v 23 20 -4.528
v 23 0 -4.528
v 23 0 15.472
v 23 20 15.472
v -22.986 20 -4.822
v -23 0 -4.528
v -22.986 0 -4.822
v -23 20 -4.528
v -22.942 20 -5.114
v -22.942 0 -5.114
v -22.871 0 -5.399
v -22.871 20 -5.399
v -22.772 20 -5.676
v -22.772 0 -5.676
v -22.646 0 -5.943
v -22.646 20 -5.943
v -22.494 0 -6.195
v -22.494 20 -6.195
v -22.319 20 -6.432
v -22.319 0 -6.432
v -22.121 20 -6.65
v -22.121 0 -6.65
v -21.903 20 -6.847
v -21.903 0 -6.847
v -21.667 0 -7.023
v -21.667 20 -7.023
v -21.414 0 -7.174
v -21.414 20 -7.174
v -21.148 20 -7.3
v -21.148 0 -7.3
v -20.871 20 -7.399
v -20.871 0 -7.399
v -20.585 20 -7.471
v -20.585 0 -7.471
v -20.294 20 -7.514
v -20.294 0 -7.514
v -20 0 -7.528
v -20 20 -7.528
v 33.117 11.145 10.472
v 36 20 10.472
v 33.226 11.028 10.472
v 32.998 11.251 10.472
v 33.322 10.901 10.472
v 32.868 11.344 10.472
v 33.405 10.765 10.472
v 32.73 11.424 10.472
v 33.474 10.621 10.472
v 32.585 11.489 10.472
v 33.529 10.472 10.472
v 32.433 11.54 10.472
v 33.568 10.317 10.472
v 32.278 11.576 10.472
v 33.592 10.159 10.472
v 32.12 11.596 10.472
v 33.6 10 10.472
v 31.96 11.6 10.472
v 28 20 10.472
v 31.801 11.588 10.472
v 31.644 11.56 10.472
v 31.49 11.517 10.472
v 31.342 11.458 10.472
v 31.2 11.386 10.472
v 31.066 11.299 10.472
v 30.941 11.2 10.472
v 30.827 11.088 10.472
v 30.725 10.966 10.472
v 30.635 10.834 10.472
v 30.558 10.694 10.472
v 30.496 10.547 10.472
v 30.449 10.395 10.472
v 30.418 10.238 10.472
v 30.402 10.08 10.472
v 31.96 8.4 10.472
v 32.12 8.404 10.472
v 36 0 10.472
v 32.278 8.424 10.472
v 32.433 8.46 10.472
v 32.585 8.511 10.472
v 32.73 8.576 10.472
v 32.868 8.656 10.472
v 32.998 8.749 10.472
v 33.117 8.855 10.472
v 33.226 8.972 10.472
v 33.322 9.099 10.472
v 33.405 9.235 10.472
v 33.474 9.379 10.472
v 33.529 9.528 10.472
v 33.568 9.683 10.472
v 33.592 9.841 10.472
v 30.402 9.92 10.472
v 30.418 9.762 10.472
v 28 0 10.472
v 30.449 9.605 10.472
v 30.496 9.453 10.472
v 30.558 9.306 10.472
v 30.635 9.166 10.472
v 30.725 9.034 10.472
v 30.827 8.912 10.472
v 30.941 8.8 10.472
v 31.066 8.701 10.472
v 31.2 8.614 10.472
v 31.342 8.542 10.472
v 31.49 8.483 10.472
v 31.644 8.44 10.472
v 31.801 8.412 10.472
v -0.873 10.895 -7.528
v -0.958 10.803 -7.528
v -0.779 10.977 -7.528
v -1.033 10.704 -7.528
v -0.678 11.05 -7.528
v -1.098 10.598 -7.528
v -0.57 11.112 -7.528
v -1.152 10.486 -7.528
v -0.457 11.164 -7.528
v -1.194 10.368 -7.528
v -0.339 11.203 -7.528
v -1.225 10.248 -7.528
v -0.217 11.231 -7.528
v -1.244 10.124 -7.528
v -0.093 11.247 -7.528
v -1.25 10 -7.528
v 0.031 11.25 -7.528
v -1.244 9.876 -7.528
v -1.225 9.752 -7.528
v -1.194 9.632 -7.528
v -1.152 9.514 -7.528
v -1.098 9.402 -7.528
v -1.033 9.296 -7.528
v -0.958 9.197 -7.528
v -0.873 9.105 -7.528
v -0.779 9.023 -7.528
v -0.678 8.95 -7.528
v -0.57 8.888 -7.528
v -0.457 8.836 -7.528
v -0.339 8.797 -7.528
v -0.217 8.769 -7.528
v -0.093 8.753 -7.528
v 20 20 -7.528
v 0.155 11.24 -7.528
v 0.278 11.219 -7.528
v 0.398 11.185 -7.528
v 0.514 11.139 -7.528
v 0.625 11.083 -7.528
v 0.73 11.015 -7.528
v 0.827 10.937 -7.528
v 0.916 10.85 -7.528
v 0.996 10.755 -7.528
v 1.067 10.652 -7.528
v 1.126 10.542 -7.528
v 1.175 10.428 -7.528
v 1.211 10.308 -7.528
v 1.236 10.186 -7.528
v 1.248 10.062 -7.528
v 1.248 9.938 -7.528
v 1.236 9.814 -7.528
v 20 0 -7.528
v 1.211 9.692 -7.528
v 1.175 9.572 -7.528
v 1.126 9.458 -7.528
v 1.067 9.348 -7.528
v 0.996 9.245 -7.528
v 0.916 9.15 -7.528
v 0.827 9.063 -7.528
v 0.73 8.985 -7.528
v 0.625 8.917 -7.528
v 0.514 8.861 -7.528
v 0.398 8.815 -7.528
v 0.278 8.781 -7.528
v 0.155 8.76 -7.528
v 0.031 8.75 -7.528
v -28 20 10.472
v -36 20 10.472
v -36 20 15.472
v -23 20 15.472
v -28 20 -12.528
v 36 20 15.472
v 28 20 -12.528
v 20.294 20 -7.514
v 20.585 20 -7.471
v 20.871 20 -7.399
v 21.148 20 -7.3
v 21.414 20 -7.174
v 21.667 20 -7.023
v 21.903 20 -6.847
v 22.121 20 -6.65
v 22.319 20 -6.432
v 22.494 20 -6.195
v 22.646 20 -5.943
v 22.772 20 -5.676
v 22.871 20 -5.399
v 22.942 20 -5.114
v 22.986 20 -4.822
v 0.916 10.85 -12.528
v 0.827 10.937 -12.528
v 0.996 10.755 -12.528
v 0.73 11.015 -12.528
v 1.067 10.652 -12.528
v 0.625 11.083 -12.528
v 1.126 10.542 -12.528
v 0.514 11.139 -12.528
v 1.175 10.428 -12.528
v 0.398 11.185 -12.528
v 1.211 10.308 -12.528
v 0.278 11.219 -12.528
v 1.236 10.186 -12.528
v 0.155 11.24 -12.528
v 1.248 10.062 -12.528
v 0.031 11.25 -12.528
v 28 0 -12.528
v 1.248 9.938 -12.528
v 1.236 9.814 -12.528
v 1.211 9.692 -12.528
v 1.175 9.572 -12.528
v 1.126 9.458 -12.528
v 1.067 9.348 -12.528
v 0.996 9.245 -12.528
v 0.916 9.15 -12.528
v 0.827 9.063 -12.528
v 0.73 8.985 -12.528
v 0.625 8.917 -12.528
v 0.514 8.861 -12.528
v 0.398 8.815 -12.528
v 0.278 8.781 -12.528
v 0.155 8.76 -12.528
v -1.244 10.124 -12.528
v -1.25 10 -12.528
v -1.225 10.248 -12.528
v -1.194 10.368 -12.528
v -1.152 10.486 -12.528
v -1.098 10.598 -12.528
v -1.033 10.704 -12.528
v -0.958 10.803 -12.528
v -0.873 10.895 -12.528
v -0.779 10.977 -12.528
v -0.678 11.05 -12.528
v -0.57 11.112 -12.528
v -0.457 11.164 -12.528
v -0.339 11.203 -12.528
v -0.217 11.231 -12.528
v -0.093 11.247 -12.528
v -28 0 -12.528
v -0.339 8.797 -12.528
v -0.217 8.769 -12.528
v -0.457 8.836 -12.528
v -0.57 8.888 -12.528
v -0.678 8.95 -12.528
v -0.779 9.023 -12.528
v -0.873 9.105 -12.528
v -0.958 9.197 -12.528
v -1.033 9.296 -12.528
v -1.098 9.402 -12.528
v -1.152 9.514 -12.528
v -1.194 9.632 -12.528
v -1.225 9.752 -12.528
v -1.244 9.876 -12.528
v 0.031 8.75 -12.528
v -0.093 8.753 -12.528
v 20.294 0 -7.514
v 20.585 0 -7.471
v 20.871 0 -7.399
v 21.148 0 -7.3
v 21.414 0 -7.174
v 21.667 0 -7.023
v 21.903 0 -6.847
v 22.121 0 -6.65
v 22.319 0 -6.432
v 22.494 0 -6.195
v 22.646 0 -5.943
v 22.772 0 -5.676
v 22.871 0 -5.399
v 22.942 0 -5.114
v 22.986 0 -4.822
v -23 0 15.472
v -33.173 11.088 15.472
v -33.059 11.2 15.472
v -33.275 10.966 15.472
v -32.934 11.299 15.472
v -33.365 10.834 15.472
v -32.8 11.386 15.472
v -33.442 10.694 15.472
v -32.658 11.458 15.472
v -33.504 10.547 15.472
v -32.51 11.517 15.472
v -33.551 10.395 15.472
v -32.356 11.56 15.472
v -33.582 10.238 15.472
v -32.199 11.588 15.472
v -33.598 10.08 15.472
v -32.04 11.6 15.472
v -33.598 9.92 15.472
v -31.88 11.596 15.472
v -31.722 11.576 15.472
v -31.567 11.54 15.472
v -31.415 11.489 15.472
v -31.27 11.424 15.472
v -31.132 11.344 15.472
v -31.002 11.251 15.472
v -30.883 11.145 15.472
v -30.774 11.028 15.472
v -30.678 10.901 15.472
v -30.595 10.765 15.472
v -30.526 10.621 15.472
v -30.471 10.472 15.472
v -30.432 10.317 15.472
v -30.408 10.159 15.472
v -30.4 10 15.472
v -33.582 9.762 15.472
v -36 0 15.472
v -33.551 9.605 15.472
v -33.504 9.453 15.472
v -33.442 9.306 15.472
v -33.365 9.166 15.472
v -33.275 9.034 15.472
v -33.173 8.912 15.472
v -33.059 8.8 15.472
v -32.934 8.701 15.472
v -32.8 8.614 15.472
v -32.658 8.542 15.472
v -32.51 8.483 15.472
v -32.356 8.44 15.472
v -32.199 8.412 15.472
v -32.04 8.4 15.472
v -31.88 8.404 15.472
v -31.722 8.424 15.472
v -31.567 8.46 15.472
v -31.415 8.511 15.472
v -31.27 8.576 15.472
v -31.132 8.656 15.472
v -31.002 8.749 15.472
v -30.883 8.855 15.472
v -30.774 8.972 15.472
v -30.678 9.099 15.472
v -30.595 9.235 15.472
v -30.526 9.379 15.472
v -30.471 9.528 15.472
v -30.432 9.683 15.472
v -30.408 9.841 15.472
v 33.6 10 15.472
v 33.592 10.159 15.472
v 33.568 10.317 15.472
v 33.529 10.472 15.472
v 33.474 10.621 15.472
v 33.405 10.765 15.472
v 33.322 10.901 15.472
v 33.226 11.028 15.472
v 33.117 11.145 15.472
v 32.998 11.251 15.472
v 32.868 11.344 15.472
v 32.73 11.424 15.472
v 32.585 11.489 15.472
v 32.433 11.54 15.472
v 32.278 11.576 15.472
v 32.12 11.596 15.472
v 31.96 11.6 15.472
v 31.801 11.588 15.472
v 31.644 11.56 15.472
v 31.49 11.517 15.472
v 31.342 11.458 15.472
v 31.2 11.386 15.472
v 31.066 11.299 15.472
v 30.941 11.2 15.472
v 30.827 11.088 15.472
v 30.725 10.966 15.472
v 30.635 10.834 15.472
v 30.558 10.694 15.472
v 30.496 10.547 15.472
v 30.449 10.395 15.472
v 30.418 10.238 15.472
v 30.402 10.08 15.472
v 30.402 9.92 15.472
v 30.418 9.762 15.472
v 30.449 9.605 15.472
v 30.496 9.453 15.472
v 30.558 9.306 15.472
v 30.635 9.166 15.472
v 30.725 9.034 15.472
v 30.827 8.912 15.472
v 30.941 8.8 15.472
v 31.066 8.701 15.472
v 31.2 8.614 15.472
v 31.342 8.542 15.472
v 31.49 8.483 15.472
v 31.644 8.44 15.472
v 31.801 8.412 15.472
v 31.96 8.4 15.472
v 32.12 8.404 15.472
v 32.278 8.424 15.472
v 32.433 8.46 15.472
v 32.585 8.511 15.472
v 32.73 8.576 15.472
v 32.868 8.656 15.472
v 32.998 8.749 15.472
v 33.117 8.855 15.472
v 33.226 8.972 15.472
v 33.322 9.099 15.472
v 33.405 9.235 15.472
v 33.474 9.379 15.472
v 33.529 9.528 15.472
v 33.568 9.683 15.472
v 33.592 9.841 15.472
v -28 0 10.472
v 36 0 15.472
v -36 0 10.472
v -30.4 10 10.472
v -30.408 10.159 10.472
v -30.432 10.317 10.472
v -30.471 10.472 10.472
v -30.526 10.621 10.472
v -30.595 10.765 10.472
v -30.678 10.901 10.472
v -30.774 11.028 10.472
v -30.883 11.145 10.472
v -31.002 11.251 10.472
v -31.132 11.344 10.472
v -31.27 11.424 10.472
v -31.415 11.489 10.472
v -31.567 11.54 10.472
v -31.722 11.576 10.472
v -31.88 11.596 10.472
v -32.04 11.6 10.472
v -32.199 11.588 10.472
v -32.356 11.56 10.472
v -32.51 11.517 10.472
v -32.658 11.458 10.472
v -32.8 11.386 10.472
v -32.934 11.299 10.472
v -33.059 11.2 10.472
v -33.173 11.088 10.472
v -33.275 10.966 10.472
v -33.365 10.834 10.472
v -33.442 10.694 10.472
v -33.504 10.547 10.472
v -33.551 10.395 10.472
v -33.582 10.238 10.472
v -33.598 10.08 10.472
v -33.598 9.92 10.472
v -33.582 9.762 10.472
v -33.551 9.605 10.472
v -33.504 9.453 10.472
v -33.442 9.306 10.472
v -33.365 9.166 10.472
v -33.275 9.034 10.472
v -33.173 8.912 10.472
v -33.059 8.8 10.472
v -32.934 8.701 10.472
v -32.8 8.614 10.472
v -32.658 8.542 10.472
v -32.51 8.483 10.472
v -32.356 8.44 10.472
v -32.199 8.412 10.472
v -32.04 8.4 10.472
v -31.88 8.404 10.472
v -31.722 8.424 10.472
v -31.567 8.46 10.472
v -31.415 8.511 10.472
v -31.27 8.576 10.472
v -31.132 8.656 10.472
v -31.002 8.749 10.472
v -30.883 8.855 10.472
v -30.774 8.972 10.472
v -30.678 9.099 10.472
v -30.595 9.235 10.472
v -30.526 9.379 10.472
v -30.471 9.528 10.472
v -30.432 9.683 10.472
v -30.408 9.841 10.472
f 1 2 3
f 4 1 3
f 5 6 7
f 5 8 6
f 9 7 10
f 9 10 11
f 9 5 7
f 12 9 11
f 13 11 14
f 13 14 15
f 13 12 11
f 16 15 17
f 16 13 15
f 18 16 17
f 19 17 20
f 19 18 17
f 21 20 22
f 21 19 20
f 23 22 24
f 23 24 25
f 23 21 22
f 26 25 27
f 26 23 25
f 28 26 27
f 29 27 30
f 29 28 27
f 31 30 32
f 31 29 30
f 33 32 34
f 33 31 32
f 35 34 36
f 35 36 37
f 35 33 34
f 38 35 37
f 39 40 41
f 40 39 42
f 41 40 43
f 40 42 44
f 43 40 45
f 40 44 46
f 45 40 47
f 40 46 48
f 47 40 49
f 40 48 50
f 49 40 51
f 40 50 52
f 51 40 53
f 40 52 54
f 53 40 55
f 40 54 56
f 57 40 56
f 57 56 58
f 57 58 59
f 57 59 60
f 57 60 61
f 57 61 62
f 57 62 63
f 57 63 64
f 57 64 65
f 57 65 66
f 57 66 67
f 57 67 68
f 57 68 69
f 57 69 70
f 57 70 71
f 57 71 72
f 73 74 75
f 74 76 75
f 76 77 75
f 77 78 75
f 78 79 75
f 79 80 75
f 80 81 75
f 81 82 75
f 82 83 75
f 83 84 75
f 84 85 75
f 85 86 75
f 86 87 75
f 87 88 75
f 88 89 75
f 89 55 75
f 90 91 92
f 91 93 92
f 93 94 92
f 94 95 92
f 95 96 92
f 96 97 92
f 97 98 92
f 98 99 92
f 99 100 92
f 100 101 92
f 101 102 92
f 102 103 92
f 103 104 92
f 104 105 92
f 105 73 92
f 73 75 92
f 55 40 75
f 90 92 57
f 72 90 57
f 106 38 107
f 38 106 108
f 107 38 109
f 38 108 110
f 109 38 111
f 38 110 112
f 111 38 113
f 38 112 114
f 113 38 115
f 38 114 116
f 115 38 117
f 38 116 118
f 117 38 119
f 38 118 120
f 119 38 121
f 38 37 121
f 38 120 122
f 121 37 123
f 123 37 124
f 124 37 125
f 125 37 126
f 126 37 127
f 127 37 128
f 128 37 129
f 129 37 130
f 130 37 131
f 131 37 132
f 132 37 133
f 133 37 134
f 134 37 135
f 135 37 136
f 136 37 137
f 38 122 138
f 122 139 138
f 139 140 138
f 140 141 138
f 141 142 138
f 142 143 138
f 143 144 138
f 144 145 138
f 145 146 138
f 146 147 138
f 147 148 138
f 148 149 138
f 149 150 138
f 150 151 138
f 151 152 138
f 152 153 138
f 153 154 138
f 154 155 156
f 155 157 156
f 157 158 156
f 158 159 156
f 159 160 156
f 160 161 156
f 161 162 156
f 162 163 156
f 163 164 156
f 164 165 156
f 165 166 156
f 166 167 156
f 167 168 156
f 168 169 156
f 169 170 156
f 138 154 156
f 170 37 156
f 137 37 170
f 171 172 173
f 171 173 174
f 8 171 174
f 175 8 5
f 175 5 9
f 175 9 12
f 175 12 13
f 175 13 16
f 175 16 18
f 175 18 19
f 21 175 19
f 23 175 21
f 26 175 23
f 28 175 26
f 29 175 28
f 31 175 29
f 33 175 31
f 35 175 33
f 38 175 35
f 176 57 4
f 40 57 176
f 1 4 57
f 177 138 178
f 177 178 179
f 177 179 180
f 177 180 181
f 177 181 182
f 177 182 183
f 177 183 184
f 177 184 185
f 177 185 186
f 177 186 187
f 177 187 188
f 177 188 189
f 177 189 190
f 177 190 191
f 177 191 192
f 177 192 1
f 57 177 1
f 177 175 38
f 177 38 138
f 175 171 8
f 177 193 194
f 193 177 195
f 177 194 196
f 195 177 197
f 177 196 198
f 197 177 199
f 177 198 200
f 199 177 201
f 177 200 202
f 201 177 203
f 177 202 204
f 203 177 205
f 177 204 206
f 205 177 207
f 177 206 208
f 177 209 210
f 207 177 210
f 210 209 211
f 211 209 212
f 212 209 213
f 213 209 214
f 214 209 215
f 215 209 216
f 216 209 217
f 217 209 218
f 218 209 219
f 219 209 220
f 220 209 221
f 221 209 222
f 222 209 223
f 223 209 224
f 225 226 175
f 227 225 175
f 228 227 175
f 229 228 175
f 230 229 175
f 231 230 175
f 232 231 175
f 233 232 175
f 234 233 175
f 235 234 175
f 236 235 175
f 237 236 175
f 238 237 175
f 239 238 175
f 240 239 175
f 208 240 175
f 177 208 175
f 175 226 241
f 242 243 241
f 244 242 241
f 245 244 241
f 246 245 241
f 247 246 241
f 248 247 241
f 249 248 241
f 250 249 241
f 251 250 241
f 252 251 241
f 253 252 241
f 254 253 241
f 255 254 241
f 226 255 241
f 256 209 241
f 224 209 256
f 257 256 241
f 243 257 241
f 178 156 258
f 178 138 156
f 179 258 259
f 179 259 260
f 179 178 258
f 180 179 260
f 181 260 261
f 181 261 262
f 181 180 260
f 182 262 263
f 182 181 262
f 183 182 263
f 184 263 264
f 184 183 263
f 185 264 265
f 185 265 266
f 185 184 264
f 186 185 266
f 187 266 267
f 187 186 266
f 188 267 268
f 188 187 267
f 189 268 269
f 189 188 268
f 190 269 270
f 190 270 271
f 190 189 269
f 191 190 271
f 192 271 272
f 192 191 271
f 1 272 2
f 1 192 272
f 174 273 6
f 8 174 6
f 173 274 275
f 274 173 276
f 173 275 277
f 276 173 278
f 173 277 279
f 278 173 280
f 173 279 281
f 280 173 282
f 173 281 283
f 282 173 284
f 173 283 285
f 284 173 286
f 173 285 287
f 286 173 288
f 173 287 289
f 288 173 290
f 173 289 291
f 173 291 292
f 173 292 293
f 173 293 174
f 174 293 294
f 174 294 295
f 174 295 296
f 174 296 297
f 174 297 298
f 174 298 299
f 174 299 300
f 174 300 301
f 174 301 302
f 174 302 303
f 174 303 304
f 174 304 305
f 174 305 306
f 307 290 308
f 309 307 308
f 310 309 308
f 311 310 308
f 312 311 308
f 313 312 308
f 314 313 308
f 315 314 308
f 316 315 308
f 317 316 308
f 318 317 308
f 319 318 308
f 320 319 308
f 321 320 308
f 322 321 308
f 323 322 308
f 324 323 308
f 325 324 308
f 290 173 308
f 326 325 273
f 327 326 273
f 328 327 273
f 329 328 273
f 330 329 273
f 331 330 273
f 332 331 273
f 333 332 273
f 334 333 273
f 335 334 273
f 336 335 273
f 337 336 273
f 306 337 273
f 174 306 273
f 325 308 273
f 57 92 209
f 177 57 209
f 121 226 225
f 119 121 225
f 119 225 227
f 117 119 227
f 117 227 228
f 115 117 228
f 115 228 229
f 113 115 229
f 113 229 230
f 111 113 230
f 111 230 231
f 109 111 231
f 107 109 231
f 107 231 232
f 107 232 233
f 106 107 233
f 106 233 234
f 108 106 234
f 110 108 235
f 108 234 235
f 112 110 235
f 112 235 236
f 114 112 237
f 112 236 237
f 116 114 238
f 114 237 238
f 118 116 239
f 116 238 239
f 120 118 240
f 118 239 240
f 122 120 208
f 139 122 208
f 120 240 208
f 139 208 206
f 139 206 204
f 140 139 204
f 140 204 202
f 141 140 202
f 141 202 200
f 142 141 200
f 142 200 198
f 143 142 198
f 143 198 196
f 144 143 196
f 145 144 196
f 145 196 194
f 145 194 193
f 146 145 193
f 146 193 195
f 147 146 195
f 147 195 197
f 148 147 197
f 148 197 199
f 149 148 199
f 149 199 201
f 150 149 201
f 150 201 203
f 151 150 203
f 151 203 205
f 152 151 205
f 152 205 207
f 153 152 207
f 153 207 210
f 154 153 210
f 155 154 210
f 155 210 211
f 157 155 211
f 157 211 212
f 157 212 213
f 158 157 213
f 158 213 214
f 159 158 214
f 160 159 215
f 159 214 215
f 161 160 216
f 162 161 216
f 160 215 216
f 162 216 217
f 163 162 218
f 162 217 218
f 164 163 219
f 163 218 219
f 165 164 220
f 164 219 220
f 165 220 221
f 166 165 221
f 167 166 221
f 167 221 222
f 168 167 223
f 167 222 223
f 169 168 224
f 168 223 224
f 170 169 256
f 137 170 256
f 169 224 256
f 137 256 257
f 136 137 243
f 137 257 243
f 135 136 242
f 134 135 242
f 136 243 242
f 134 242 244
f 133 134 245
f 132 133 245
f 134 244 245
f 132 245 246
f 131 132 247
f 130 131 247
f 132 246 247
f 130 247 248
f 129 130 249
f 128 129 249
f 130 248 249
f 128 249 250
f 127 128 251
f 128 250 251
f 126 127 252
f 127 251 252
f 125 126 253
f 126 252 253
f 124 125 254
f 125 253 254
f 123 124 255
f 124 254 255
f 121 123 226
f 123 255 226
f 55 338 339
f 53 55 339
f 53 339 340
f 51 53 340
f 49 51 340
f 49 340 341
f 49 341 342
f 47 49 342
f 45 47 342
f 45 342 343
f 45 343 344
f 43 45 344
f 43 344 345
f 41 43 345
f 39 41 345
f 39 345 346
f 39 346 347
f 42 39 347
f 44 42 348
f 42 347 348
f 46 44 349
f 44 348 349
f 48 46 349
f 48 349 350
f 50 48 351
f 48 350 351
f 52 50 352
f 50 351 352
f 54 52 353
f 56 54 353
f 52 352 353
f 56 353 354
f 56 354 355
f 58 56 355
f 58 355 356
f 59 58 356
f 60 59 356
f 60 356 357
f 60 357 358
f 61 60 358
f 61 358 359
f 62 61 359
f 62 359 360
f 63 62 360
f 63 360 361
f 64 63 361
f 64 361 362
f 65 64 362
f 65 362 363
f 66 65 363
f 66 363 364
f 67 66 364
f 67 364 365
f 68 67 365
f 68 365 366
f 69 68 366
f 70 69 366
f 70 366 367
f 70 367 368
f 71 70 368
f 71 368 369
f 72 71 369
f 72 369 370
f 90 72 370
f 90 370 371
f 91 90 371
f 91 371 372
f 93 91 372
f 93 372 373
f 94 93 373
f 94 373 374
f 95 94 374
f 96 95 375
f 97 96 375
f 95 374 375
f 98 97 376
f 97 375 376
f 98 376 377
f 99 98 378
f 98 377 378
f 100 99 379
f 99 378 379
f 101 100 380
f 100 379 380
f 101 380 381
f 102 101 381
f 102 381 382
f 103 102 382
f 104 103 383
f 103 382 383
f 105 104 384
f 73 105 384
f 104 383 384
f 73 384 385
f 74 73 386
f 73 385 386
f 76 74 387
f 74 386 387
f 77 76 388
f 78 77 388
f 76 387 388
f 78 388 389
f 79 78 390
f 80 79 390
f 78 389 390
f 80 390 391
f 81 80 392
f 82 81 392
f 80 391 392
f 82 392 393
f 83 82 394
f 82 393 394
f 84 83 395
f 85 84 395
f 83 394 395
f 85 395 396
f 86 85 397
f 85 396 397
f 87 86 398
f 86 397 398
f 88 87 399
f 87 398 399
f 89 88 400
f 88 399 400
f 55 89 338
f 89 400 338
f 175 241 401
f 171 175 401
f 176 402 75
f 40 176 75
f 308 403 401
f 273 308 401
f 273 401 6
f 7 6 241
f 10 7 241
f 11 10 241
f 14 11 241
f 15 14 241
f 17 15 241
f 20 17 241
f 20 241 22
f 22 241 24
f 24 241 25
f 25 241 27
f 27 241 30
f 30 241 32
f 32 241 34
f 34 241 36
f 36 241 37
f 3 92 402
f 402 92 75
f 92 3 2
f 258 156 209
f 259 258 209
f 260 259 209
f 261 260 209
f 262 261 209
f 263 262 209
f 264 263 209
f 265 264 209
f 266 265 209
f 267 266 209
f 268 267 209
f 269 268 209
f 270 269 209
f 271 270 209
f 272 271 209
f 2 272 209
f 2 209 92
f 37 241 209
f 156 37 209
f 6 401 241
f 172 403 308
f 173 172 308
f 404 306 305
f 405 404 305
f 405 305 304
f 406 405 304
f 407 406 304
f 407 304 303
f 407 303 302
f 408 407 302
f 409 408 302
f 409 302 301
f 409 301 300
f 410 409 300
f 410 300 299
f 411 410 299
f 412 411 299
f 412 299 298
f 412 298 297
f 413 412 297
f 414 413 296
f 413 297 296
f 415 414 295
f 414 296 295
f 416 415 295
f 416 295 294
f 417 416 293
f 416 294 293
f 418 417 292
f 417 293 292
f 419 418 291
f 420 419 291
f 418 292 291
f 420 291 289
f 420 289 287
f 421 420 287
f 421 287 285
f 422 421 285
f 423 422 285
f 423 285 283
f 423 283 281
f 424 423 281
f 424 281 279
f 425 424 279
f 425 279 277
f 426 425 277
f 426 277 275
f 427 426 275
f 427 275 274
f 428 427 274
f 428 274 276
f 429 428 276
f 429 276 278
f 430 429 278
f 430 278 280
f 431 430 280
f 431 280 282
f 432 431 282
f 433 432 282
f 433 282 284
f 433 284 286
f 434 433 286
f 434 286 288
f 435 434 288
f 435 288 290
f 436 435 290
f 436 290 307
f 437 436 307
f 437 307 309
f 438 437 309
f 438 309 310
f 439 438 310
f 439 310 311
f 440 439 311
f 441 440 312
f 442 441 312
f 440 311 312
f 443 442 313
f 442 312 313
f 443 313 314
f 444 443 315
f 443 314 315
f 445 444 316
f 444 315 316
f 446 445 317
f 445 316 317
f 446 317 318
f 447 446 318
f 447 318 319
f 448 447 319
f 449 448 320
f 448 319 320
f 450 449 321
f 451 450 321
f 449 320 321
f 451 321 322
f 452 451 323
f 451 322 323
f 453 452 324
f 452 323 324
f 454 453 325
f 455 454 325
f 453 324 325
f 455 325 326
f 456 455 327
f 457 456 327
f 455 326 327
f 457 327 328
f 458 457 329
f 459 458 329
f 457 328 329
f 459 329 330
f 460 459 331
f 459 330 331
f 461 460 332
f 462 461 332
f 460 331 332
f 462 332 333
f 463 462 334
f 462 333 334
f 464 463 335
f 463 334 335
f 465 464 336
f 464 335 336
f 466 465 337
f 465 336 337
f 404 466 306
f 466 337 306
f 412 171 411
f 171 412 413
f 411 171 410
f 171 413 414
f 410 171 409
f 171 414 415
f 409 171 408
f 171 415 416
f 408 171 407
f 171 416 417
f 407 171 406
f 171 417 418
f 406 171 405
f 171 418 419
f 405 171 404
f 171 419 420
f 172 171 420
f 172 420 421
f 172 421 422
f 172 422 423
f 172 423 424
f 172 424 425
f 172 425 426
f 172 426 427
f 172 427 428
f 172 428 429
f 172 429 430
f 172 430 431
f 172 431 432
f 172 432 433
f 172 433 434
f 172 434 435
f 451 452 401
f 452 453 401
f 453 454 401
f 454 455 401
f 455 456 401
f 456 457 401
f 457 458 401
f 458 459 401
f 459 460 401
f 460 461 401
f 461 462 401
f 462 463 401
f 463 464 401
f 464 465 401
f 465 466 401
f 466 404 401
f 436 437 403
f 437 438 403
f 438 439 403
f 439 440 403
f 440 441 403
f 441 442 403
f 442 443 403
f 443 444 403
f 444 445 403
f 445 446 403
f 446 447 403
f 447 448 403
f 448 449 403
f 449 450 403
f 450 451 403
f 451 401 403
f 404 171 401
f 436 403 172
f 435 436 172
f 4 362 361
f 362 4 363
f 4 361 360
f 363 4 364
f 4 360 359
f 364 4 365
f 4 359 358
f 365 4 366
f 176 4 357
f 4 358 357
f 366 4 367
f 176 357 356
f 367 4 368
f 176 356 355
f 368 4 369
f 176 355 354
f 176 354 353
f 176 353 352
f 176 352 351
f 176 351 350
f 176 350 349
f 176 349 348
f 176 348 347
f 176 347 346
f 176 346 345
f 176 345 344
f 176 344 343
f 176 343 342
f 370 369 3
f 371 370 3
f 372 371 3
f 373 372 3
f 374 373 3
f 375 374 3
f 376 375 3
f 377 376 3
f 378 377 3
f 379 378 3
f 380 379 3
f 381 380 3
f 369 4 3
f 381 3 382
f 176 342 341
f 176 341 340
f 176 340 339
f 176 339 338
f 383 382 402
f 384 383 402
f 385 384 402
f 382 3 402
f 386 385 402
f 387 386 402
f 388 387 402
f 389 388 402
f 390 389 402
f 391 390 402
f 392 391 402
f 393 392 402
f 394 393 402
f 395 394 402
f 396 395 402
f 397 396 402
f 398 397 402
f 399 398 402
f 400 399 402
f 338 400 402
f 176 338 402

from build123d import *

# Parameters (mm, degrees)
BOSS_EXTRUDE1_DEPTH = 20
FILLET1_R           = 3
CUT_EXTRUDE1_REACH  = 51.8
SKETCH3_R           = 1.6
CUT_EXTRUDE2_REACH  = 51.8
SKETCH4_R           = 1.25


with BuildPart() as part:
    # Sketch1 → Boss-Extrude1 (new body)
    with BuildSketch(Plane(origin=(0, 0, 0), x_dir=(1, 0, 0), z_dir=(0, 1, 0))):
        Polygon((28, 12.528445914), (-28, 12.528445914), (-28, -10.471554086), (-36, -10.471554086), (-36, -15.471554086), (-23, -15.471554086), (-23, 7.528445914), (23, 7.528445914), (23, -15.471554086), (36, -15.471554086), (36, -10.471554086), (28, -10.471554086), align=None)
    extrude(amount=BOSS_EXTRUDE1_DEPTH)

    # Fillet1
    fillet1_edges = [part.edges().sort_by_distance(p)[0] for p in [
        (23, 10, -7.528445914),
        (-23, 10, -7.528445914),
    ]]
    fillet(fillet1_edges, radius=FILLET1_R)

    # Sketch3 → Cut-Extrude1 (cut, up to next)
    with BuildSketch(Plane.XY.offset(15.471554086), mode=Mode.PRIVATE) as cut_extrude1_sk1:
        with Locations((-32, 10)):
            Circle(SKETCH3_R)
    cut_extrude1_tool1 = extrude(cut_extrude1_sk1.sketch, amount=-CUT_EXTRUDE1_REACH, mode=Mode.PRIVATE) & part.part
    # Sketch3 → Cut-Extrude1 (cut, up to next)
    with BuildSketch(Plane.XY.offset(15.471554086), mode=Mode.PRIVATE) as cut_extrude1_sk2:
        with Locations((32, 10)):
            Circle(SKETCH3_R)
    cut_extrude1_tool2 = extrude(cut_extrude1_sk2.sketch, amount=-CUT_EXTRUDE1_REACH, mode=Mode.PRIVATE) & part.part
    add(cut_extrude1_tool1.solids().sort_by_distance((-32, 10, 15.471554))[0], mode=Mode.SUBTRACT)
    add(cut_extrude1_tool2.solids().sort_by_distance((32, 10, 15.471554))[0], mode=Mode.SUBTRACT)

    # Sketch4 → Cut-Extrude2 (cut, up to next)
    with BuildSketch(Plane(origin=(0, 0, -12.528445914), x_dir=(-1, 0, 0), z_dir=(0, 0, -1)), mode=Mode.PRIVATE) as cut_extrude2_sk1:
        with Locations((0, 10)):
            Circle(SKETCH4_R)
    cut_extrude2_tool1 = extrude(cut_extrude2_sk1.sketch, amount=-CUT_EXTRUDE2_REACH, mode=Mode.PRIVATE) & part.part
    add(cut_extrude2_tool1.solids().sort_by_distance((0, 10, -12.528446))[0], mode=Mode.SUBTRACT)


solid = part.part
